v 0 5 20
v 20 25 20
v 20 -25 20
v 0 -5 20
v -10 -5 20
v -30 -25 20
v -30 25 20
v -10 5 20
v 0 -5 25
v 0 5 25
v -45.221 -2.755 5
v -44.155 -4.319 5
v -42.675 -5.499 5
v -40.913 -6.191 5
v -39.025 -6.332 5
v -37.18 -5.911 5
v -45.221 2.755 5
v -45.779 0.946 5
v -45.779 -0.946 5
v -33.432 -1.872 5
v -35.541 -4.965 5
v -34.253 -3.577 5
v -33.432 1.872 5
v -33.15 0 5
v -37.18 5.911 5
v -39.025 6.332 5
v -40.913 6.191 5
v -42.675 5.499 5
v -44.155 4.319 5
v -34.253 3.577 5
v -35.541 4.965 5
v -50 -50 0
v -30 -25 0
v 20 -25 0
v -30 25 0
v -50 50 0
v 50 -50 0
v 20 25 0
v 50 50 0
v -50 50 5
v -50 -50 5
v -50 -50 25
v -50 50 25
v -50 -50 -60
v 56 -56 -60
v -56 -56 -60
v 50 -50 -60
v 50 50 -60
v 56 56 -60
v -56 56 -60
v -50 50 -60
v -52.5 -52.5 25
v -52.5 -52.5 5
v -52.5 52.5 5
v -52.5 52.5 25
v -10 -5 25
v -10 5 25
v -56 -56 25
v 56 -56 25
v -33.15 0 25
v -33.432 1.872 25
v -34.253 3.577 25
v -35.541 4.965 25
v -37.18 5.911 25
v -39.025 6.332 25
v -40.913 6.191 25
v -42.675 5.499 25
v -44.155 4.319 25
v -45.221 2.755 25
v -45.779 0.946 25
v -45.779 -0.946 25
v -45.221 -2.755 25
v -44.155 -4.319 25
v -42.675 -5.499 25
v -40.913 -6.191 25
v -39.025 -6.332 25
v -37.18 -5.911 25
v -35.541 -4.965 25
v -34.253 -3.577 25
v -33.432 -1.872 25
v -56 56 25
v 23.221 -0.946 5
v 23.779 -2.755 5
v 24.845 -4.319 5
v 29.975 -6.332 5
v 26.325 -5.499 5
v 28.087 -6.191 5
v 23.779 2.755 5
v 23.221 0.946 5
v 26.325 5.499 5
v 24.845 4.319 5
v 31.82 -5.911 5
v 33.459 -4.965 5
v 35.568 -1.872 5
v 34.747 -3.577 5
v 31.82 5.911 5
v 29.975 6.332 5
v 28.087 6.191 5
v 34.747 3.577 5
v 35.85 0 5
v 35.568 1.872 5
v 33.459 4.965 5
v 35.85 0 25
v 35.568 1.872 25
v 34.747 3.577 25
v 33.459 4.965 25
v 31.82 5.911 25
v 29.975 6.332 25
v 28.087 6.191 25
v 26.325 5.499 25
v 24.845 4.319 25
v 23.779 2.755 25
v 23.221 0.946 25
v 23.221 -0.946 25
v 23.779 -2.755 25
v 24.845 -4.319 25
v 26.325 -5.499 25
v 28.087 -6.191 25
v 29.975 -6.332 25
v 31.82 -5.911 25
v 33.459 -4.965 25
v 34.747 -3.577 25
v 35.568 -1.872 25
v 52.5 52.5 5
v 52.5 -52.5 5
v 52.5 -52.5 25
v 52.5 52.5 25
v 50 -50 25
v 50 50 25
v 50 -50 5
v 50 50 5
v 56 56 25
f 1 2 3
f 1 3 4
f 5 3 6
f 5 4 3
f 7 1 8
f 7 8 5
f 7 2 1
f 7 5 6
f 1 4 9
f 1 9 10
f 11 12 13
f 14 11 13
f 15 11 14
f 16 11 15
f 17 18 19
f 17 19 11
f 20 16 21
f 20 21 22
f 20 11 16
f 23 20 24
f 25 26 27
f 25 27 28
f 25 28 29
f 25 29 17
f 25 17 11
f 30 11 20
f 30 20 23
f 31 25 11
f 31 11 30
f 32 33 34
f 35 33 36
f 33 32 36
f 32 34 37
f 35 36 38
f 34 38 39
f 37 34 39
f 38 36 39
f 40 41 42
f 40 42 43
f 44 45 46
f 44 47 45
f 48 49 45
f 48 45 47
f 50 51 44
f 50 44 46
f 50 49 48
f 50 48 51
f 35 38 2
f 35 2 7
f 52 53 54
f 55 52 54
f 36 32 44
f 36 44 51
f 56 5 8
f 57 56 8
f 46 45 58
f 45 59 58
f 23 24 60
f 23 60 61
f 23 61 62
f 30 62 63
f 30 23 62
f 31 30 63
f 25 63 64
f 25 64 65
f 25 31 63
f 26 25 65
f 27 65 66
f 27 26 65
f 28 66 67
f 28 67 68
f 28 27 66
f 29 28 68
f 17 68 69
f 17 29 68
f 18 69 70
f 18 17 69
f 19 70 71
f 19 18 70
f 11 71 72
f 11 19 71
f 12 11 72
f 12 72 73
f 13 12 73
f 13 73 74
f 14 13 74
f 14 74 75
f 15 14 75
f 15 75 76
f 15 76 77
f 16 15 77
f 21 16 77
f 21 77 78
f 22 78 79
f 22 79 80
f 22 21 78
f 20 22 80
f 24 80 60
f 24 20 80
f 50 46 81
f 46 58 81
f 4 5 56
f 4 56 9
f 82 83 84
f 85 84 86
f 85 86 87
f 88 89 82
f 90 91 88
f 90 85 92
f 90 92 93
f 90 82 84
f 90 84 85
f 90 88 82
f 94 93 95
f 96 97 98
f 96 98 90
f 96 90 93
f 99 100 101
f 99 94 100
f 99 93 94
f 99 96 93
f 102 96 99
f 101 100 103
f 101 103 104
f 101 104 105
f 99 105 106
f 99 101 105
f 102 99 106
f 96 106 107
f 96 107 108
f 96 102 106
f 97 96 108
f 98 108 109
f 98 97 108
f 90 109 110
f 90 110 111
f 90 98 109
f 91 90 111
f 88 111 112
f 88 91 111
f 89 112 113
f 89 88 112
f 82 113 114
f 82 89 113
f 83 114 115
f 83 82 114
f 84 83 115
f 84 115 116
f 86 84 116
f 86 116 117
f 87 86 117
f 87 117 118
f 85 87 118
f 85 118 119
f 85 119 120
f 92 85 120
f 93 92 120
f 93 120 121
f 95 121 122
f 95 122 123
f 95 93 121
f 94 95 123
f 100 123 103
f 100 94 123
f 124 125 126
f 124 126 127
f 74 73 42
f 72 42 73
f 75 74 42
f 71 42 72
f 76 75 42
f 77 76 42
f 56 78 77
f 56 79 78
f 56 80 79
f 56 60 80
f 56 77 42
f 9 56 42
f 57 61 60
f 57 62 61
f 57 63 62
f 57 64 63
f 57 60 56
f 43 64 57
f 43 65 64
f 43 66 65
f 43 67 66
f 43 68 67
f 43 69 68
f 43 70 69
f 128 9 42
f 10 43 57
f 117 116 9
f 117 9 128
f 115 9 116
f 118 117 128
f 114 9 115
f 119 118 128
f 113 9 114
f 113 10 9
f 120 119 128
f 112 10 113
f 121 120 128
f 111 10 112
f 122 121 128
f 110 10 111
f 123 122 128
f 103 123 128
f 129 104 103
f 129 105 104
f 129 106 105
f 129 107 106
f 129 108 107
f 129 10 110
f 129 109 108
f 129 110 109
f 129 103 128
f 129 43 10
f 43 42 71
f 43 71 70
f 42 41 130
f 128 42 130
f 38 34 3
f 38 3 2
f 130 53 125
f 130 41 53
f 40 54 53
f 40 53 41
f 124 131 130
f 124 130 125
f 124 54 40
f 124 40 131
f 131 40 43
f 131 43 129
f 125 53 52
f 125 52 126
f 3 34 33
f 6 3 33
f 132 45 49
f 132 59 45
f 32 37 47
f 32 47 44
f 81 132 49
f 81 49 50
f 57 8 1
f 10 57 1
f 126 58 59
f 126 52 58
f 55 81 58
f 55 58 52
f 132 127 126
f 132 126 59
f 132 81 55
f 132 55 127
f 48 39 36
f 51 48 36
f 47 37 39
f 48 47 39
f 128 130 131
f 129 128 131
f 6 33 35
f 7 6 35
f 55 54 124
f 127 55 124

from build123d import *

# Parameters (mm, degrees)
SKETCH2_W           = 112
SKETCH2_H           = 112
SKETCH2_W_2         = 10
SKETCH2_H_2         = 10
BOSS_EXTRUDE1_DEPTH = 5
SKETCH3_W           = 112
SKETCH3_H           = 112
SKETCH3_W_2         = 105
SKETCH3_H_2         = 105
SKETCH3_W_3         = 100
SKETCH3_H_3         = 100
SKETCH3_R           = 6.35
SKETCH3_W_4         = 10
SKETCH3_H_4         = 10
BOSS_EXTRUDE2_DEPTH = 20
SKETCH4_W           = 50
SKETCH4_H           = 50
CUT_EXTRUDE1_DEPTH  = 20
SKETCH8_W           = 112
SKETCH8_H           = 112
SKETCH8_W_2         = 100
SKETCH8_H_2         = 100
BOSS_EXTRUDE3_DEPTH = 60


with BuildPart() as part:
    # Sketch2 → Boss-Extrude1 (new body)
    with BuildSketch(Plane.XY):
        Rectangle(SKETCH2_W, SKETCH2_H)
        with Locations((-5, 0)):
            Rectangle(SKETCH2_W_2, SKETCH2_H_2, mode=Mode.SUBTRACT)
    extrude(amount=BOSS_EXTRUDE1_DEPTH)

    # Sketch3 → Boss-Extrude2 (add)
    # profile 1 of 2: a face of its own
    with BuildSketch(Plane.XY.offset(5)):
        Rectangle(SKETCH3_W, SKETCH3_H)
        Rectangle(SKETCH3_W_2, SKETCH3_H_2, mode=Mode.SUBTRACT)
    # profile 2 of 2: a face of its own
    with BuildSketch(Plane.XY.offset(5)):
        Rectangle(SKETCH3_W_3, SKETCH3_H_3)
        with Locations((-39.5, 0)):
            Circle(SKETCH3_R, mode=Mode.SUBTRACT)
        with Locations((-5, 0)):
            Rectangle(SKETCH3_W_4, SKETCH3_H_4, mode=Mode.SUBTRACT)
        with Locations((29.5, 0)):
            Circle(SKETCH3_R, mode=Mode.SUBTRACT)
    extrude(amount=BOSS_EXTRUDE2_DEPTH)

    # Sketch4 → Cut-Extrude1 (cut)
    with BuildSketch(Plane(origin=(0, 0, 0), x_dir=(-1, 0, 0), z_dir=(0, 0, -1))):
        with Locations((5, 0)):
            Rectangle(SKETCH4_W, SKETCH4_H)
    extrude(amount=-CUT_EXTRUDE1_DEPTH, mode=Mode.SUBTRACT)

    # Sketch8 → Boss-Extrude3 (add)
    with BuildSketch(Plane(origin=(0, 0, 0), x_dir=(-1, 0, 0), z_dir=(0, 0, -1))):
        Rectangle(SKETCH8_W, SKETCH8_H)
        Rectangle(SKETCH8_W_2, SKETCH8_H_2, mode=Mode.SUBTRACT)
    extrude(amount=BOSS_EXTRUDE3_DEPTH)


solid = part.part
